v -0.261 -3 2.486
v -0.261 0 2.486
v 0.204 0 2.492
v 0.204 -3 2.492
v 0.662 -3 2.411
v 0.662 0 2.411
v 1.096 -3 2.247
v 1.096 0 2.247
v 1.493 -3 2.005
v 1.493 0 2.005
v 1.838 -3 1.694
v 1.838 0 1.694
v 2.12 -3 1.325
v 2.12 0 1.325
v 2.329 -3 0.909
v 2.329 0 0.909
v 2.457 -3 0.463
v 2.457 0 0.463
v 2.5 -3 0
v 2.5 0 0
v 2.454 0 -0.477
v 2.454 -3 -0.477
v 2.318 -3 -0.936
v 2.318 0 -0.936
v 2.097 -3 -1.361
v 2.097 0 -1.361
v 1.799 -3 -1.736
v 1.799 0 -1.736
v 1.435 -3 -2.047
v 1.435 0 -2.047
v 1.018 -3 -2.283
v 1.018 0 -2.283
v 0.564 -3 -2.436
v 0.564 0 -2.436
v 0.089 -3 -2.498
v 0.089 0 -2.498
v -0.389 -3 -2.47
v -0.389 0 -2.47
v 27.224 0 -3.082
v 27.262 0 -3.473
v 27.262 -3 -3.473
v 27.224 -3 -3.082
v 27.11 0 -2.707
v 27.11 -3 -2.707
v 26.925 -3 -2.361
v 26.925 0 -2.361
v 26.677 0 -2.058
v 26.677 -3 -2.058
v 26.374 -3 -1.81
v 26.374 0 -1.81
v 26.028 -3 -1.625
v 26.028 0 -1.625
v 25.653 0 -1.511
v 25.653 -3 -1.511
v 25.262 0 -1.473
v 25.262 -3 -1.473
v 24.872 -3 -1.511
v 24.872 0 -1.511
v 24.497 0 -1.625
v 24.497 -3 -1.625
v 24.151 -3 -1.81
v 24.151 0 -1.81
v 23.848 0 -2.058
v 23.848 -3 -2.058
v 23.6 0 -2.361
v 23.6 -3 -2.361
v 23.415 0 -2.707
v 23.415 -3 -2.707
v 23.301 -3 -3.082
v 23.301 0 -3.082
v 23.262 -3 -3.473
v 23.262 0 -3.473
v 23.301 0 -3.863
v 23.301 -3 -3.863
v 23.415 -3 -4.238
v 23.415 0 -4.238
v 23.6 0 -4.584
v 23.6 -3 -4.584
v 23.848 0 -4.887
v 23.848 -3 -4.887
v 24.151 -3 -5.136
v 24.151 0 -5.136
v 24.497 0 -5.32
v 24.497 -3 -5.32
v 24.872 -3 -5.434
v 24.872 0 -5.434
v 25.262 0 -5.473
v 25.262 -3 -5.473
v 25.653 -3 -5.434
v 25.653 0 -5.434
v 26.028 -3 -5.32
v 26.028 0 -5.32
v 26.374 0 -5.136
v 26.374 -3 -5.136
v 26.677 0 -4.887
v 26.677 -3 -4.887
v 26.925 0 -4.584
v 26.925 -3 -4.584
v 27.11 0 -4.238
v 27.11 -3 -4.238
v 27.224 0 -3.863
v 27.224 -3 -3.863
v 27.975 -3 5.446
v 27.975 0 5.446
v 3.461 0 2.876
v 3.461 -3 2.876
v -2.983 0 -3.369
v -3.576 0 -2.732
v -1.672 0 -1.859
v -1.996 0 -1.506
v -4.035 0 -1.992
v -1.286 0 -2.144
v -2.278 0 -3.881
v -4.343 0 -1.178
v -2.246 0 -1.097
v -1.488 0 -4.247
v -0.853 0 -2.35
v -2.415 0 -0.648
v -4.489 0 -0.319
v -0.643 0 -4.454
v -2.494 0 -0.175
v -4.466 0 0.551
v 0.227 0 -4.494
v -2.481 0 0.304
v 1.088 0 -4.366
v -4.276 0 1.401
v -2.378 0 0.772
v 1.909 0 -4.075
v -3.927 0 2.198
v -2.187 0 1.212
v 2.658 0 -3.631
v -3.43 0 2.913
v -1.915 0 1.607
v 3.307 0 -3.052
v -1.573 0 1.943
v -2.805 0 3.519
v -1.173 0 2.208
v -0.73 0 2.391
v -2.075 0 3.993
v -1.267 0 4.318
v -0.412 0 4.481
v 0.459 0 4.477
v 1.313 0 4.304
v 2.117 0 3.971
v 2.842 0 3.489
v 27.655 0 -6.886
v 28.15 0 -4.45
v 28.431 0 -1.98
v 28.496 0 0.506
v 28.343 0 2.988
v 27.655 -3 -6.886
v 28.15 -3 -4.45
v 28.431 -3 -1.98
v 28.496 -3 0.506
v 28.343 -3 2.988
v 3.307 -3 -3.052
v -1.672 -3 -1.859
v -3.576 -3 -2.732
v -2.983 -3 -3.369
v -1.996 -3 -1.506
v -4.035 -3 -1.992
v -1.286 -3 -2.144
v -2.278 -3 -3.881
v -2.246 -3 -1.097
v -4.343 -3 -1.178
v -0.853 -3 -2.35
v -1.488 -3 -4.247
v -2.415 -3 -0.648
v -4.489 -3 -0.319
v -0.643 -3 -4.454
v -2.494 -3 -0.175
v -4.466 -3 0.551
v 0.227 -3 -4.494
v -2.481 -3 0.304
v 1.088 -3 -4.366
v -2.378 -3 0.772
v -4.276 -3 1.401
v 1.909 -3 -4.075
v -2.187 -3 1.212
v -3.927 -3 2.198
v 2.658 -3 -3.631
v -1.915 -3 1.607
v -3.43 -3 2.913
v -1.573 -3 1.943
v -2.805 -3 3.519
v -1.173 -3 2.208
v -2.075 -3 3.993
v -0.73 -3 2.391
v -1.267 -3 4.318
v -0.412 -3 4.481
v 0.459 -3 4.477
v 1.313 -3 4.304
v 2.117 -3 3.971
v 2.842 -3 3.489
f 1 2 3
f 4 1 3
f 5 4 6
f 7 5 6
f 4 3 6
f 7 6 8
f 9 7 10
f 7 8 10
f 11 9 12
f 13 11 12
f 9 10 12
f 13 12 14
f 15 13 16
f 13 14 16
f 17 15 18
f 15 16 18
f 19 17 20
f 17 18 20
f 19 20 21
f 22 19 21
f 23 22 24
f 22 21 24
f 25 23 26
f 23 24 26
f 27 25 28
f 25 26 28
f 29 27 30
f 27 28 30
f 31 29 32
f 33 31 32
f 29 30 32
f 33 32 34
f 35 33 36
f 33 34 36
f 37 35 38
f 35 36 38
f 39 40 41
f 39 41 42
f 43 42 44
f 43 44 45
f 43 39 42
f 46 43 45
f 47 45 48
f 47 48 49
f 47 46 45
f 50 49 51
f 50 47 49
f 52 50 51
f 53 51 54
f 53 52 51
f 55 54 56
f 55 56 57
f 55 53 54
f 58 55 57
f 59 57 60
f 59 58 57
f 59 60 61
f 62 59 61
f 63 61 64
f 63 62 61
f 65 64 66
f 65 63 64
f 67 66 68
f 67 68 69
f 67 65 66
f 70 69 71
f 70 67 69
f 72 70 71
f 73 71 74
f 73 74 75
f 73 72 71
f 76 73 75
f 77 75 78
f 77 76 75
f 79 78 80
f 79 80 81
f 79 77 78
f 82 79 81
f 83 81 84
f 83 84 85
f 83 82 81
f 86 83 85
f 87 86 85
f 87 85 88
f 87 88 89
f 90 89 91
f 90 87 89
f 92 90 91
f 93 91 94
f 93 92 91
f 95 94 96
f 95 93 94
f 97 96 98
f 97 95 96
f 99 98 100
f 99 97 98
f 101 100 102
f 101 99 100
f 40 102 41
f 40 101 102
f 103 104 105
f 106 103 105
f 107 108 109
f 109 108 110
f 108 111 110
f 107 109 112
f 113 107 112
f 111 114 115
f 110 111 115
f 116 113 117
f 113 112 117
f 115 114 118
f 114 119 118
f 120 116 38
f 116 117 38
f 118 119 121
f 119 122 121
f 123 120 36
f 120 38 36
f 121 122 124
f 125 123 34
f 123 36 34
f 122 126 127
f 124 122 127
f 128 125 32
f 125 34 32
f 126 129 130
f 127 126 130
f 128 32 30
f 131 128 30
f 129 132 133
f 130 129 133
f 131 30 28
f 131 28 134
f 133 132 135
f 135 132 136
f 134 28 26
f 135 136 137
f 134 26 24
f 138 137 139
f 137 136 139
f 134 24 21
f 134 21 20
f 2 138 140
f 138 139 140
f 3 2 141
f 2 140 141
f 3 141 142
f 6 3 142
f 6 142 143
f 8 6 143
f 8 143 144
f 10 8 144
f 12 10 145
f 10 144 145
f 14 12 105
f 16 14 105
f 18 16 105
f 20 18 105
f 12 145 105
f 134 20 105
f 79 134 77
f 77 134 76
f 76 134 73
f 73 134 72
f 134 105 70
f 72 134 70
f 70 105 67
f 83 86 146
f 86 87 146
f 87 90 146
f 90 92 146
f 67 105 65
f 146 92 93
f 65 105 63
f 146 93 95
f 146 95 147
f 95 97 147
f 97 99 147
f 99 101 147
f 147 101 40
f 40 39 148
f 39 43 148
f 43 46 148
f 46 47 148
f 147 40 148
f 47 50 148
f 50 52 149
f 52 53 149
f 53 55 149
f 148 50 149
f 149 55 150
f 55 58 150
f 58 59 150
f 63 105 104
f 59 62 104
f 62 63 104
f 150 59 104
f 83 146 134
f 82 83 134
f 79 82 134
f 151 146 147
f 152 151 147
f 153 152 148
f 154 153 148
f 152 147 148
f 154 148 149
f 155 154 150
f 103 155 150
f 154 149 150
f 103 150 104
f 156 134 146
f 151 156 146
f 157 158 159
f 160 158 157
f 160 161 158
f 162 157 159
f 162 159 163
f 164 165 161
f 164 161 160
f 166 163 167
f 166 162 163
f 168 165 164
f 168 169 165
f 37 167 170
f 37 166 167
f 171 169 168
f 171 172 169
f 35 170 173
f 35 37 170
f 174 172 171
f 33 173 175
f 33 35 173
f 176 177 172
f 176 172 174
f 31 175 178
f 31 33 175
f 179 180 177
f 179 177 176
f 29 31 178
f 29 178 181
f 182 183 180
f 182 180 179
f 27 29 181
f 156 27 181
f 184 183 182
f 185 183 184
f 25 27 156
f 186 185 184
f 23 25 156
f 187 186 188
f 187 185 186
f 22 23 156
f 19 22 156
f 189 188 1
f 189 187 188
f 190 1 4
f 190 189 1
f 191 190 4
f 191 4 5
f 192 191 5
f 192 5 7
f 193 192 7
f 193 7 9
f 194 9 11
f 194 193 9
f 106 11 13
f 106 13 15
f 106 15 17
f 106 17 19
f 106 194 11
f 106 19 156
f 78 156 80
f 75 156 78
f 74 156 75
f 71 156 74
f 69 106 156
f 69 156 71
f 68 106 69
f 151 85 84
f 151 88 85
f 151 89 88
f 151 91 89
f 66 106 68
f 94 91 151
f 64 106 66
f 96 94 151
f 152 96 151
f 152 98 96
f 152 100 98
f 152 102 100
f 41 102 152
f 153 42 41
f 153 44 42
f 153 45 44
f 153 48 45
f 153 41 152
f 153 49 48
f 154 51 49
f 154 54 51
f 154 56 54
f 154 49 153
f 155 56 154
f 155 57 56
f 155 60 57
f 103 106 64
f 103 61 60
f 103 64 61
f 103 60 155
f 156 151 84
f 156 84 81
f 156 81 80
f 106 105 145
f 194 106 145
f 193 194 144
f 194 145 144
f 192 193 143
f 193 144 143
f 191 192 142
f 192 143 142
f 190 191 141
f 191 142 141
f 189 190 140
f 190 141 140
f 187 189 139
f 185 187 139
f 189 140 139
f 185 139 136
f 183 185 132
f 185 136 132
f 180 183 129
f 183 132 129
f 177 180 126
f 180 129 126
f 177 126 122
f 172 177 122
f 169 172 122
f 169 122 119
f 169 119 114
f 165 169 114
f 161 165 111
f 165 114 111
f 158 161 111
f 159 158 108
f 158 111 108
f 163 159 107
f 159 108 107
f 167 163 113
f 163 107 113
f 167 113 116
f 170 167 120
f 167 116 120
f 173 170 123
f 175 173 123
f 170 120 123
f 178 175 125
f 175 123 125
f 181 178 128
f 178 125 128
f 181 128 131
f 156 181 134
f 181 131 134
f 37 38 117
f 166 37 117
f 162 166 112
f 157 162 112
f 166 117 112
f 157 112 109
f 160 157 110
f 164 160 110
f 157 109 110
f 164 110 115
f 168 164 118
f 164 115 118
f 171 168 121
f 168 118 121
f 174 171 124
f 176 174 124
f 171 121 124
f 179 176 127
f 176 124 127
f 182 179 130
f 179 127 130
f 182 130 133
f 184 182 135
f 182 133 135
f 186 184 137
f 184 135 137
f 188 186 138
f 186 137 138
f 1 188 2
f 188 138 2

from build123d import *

# Parameters (mm, degrees)
F0_R     = 2
F1_DEPTH = 3


with BuildPart() as f1:
    # F0 (on Front) → F1 (new body)
    with BuildSketch(Plane.XZ):
        with BuildLine():
            Line((27.974745, 5.446434), (3.460605, 2.876493))
            ThreePointArc((3.460605, 2.876493), (4.232182, 1.529261), (4.5, 0))
            ThreePointArc((4.5, 0), (4.191191, -1.638267), (3.307147, -3.051685))
            Line((3.307147, -3.051685), (27.655492, -6.886493))
            ThreePointArc((27.655492, -6.886493), (28.490456, -0.737511), (27.974745, 5.446434))
        make_face()
        with Locations((25.262442, -3.472612)):
            Circle(F0_R, mode=Mode.SUBTRACT)
        with BuildLine():
            ThreePointArc((-0.260659, 2.486374), (1.673074, 1.857639), (2.5, 0))
            ThreePointArc((2.5, 0), (1.624442, -1.900312), (-0.38895, -2.469558))
            Line((-0.38895, -2.469558), (3.307147, -3.051685))
            ThreePointArc((3.307147, -3.051685), (4.191191, -1.638267), (4.5, 0))
            ThreePointArc((4.5, 0), (4.232182, 1.529261), (3.460605, 2.876493))
            Line((3.460605, 2.876493), (-0.260659, 2.486374))
        make_face()
        with BuildLine():
            ThreePointArc((-0.38895, -2.469558), (-2.499163, 0.064694), (-0.260659, 2.486374))
            Line((-0.260659, 2.486374), (3.460605, 2.876493))
            ThreePointArc((3.460605, 2.876493), (-4.498493, 0.116449), (3.307147, -3.051685))
            Line((3.307147, -3.051685), (-0.38895, -2.469558))
        make_face()
    extrude(amount=F1_DEPTH)


solid = f1.part
